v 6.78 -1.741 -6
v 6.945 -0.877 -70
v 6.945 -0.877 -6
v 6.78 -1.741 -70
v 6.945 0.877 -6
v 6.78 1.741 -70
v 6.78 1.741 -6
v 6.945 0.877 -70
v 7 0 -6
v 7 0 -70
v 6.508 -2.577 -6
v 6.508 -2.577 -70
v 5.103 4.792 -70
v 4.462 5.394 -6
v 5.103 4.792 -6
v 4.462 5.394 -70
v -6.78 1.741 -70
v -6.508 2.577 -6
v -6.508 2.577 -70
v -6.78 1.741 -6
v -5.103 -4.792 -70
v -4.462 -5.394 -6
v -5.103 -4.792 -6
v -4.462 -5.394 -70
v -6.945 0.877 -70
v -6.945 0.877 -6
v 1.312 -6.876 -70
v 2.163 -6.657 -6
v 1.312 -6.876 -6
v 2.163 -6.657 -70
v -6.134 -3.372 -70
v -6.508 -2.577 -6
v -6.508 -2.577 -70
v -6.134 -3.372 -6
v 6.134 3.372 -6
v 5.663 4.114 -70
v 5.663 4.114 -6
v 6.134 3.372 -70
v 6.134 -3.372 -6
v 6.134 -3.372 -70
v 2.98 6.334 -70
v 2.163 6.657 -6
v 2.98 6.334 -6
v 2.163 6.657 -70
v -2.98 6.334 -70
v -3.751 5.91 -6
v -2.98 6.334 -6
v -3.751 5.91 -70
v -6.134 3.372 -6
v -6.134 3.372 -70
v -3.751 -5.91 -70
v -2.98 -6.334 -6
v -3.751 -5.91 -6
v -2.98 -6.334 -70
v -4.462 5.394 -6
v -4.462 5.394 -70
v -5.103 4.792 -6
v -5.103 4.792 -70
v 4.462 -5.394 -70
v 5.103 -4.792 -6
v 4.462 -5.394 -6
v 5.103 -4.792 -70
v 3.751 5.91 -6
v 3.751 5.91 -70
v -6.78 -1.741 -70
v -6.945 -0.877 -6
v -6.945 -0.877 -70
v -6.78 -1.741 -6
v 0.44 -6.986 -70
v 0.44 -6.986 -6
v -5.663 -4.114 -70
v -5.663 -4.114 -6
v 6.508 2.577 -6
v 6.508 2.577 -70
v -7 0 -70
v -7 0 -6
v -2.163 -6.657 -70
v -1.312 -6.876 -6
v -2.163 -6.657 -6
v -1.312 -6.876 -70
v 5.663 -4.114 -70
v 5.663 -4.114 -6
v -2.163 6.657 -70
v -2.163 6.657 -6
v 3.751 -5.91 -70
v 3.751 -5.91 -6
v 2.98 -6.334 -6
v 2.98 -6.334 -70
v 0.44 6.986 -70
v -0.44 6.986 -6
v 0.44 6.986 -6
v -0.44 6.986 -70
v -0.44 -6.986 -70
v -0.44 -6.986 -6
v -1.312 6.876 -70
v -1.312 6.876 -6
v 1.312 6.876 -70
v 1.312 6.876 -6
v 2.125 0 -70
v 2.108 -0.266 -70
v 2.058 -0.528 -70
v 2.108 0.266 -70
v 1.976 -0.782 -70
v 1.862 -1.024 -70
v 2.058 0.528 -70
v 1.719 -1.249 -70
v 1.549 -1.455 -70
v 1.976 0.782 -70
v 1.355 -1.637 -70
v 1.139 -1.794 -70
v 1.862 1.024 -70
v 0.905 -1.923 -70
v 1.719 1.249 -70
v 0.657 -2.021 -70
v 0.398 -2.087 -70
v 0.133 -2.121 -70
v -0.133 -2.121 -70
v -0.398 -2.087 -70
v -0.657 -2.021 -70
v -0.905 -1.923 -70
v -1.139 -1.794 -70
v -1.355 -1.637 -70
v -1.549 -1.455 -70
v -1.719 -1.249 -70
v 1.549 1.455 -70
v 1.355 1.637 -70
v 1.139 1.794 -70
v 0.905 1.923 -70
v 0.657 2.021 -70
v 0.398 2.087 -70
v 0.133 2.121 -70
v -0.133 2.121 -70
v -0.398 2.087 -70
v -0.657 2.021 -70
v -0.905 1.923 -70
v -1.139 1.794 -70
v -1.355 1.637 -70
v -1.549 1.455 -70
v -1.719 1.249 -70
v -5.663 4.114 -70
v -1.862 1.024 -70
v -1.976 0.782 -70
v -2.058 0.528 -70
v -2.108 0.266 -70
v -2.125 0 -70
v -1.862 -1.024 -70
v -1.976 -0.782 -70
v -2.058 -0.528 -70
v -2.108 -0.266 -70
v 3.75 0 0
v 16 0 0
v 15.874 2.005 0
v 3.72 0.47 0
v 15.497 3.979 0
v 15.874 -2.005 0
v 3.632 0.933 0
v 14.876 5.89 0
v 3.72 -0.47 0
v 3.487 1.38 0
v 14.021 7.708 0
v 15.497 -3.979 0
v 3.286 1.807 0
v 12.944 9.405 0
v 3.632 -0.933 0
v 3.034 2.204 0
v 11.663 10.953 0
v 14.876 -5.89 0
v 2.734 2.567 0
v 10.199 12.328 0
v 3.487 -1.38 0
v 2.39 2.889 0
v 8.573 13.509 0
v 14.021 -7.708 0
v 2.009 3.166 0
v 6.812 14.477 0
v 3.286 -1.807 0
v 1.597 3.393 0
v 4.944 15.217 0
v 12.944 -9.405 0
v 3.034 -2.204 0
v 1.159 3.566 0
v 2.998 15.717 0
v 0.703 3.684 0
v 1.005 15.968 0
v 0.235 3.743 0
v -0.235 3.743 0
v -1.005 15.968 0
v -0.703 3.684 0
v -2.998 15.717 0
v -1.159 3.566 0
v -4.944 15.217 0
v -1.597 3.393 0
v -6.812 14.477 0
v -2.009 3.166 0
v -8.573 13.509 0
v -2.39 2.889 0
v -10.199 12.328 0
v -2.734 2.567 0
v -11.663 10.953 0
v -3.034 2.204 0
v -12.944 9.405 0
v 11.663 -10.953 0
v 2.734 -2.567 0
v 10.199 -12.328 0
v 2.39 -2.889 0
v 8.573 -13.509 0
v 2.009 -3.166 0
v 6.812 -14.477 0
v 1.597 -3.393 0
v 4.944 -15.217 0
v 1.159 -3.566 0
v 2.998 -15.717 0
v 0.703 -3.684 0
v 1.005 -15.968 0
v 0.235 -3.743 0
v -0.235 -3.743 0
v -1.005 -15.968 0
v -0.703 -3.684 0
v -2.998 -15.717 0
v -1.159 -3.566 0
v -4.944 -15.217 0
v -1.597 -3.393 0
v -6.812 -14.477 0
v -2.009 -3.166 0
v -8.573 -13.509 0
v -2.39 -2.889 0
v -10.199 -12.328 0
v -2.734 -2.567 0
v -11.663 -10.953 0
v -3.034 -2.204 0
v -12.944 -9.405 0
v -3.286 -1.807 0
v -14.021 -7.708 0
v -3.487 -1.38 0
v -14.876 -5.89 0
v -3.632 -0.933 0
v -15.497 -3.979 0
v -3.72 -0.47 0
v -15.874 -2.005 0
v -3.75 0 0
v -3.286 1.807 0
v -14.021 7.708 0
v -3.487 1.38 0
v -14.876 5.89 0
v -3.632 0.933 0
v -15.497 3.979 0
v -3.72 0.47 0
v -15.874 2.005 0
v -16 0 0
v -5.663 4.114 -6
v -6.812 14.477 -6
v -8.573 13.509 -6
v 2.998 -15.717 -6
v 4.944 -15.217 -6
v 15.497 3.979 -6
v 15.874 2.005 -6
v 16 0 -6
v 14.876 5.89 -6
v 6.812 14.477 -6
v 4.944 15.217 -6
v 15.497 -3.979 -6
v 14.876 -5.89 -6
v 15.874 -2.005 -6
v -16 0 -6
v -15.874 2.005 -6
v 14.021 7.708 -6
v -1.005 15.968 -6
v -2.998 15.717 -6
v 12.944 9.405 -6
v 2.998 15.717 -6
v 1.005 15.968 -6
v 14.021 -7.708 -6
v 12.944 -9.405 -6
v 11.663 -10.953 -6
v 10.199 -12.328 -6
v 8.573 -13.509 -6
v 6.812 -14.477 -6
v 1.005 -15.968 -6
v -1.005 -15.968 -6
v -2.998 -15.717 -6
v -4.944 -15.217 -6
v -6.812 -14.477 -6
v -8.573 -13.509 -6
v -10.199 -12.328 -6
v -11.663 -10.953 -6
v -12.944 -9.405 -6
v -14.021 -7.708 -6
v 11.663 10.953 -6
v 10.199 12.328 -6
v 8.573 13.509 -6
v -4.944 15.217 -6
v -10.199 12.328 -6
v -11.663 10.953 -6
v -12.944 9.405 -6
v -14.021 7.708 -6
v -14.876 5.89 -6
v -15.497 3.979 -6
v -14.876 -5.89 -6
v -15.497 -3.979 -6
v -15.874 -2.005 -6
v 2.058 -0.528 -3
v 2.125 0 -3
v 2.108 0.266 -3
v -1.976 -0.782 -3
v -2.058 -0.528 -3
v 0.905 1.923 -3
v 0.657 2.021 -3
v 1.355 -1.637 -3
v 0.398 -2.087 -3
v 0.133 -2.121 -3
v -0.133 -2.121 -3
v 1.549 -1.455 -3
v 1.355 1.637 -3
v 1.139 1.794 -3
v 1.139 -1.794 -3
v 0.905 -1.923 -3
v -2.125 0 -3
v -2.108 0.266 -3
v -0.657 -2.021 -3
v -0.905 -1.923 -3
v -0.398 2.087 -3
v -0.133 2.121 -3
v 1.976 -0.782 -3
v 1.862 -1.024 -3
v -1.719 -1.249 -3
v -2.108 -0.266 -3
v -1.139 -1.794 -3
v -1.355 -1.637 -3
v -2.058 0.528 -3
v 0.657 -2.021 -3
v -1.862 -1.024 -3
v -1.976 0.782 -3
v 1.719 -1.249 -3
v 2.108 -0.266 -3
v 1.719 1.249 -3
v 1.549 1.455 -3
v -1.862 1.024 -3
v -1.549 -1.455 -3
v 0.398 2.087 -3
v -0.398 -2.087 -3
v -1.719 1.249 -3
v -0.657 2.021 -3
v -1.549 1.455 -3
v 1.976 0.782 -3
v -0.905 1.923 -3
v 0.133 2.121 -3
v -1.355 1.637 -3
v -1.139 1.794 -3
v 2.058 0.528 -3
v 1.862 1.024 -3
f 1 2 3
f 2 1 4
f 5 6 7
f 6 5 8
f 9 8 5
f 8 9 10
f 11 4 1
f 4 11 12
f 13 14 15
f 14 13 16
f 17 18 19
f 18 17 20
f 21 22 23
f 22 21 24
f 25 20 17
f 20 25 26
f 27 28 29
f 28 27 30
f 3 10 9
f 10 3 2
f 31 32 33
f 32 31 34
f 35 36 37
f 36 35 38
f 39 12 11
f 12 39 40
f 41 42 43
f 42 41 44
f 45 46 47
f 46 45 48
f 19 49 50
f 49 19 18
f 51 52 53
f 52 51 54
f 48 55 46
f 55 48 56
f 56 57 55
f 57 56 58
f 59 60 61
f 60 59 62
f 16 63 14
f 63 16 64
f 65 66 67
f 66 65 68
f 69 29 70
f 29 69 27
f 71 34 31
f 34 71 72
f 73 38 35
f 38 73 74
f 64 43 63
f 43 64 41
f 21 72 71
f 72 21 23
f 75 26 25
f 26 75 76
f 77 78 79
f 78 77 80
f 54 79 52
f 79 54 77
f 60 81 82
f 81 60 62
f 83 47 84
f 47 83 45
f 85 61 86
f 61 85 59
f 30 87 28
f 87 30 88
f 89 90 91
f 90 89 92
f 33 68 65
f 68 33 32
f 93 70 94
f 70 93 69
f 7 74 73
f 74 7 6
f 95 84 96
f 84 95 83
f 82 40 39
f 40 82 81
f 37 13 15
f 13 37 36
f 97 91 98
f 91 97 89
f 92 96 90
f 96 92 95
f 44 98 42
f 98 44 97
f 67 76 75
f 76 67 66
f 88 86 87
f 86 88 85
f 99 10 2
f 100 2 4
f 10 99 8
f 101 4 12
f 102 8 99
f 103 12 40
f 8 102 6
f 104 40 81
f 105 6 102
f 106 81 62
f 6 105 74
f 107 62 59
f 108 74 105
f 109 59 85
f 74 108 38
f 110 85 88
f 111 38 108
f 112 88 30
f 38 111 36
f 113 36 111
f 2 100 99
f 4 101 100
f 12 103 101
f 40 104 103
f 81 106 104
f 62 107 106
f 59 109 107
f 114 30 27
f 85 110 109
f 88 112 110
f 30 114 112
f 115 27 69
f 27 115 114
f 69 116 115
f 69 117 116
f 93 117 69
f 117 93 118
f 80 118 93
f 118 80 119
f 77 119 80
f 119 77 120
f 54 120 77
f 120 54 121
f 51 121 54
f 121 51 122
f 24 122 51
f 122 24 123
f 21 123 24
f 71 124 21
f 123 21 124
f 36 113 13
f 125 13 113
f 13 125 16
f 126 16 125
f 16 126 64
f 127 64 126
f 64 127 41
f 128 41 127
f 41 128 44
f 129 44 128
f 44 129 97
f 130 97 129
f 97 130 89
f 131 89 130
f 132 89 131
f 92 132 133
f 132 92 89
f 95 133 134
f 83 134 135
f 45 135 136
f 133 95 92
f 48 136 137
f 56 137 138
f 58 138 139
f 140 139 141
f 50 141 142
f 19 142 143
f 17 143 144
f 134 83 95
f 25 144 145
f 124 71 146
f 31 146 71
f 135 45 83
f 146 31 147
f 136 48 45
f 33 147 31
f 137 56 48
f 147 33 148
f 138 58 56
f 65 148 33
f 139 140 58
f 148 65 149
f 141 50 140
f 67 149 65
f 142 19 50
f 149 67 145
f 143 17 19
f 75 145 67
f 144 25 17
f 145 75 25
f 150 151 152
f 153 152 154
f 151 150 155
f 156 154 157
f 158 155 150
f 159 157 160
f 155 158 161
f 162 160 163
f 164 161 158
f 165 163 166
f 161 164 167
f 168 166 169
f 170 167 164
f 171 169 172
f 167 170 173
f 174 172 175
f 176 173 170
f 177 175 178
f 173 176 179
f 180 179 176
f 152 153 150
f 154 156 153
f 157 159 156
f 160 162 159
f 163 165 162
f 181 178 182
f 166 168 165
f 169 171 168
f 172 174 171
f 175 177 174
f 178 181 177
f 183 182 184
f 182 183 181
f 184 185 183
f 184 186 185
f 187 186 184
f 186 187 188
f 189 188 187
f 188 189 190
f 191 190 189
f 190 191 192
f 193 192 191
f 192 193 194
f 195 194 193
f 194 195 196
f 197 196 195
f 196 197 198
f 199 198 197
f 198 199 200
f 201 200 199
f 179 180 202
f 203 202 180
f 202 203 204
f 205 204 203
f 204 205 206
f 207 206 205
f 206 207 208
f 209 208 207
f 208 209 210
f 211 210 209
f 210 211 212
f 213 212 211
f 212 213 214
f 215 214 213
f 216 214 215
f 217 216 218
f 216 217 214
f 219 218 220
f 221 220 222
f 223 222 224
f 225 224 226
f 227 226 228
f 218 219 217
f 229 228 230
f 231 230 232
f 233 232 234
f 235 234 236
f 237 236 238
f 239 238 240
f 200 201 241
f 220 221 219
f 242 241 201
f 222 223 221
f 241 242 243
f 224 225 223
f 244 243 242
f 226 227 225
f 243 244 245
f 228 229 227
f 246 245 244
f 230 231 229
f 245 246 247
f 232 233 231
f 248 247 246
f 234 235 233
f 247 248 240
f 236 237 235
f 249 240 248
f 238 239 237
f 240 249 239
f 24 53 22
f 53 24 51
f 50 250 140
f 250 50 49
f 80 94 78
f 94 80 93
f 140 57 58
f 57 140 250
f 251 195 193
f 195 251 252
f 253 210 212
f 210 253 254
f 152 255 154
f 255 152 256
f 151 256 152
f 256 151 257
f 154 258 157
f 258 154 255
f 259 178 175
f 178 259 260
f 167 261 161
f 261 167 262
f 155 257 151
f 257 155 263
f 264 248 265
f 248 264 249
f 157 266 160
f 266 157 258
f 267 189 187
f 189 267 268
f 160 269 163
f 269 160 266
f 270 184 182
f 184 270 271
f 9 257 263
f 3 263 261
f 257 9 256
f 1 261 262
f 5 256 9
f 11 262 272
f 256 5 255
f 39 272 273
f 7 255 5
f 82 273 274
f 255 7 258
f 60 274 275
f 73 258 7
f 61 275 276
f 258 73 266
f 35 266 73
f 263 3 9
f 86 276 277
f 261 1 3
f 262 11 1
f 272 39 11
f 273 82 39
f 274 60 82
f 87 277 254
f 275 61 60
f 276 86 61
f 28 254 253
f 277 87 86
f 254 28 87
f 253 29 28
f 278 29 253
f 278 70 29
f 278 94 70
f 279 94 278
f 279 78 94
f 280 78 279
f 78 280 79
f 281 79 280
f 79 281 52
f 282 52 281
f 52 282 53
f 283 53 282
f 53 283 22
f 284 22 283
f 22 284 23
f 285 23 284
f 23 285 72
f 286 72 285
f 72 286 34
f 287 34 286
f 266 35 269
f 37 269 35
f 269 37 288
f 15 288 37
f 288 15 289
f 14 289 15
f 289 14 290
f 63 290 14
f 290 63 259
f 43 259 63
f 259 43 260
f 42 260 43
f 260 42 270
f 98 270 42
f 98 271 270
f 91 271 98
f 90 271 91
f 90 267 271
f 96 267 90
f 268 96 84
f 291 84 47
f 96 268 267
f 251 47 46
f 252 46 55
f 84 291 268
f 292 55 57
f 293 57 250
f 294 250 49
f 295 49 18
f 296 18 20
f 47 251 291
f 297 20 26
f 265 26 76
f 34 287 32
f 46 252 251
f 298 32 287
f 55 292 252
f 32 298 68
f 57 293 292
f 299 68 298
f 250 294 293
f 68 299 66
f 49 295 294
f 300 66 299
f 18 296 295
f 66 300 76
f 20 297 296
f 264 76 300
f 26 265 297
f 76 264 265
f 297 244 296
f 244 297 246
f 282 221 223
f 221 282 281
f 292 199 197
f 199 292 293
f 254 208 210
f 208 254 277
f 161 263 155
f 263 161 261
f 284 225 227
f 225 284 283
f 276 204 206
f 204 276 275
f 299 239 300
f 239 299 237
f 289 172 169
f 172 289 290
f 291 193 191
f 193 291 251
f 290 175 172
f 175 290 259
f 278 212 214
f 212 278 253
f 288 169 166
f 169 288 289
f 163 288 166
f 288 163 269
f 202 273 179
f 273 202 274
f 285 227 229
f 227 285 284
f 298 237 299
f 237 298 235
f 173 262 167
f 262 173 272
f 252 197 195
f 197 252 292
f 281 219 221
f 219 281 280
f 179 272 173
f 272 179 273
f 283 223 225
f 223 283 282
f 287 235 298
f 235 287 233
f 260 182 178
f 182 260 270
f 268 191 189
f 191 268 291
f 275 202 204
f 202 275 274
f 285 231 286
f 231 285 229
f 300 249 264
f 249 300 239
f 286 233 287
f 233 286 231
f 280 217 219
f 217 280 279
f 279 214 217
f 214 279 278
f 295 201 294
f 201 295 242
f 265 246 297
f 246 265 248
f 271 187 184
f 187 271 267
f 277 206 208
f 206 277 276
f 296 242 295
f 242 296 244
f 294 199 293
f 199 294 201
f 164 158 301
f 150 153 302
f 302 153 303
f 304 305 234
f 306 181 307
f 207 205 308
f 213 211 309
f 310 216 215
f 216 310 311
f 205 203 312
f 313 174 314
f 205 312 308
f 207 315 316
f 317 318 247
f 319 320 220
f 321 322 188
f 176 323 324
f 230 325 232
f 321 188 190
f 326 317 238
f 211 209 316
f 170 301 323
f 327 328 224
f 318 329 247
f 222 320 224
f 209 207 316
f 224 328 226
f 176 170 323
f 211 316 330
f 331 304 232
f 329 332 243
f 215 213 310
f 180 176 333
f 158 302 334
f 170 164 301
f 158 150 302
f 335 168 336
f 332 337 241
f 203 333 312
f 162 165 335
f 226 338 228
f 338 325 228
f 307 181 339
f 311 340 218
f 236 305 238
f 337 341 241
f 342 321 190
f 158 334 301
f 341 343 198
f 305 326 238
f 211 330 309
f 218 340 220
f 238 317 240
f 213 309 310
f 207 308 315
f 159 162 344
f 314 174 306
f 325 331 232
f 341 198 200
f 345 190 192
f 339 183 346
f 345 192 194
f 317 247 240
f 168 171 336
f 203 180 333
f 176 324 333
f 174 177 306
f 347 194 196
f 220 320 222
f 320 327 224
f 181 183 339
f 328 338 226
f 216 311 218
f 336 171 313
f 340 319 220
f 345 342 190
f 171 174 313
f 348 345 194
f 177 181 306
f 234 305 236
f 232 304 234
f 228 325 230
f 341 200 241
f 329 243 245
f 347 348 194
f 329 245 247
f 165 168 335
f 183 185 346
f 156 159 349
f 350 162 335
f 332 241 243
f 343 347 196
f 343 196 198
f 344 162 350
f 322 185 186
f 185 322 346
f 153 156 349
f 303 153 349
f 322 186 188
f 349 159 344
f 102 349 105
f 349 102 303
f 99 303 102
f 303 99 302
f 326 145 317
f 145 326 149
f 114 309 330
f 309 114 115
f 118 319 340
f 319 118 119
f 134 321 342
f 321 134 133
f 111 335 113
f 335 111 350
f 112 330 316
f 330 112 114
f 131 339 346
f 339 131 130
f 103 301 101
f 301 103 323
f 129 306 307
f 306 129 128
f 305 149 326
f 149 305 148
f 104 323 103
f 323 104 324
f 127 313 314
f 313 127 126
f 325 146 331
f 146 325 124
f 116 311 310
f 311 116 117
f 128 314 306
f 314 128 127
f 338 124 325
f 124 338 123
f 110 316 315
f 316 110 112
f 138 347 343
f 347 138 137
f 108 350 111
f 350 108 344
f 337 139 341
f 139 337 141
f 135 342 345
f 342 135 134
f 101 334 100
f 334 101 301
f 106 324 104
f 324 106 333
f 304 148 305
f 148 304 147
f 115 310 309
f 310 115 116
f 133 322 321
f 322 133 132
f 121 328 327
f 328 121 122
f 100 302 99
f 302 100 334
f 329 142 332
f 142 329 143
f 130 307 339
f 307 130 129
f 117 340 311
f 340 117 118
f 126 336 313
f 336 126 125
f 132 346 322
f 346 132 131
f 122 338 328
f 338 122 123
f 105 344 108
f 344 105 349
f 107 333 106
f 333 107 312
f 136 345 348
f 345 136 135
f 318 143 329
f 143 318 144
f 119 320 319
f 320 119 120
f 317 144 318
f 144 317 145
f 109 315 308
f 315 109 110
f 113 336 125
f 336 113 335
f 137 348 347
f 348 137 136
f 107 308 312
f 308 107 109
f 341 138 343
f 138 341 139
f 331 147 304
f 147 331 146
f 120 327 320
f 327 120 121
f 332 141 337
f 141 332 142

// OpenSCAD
$fn = 50;


difference() {
	union() {
		translate(v = [0, 0, -70.0000000000]) {
			cylinder(h = 70, r = 7.0000000000);
		}
		translate(v = [0, 0, -6.0000000000]) {
			cylinder(h = 6, r = 16.0000000000);
		}
	}
	union() {
		translate(v = [0, 0, 0]) {
			rotate(a = [0, 0, 0]) {
				difference() {
					union() {
						#translate(v = [0, 0, -70.0000000000]) {
							cylinder(h = 70, r = 2.0000000000);
						}
						#translate(v = [0, 0, -3]) {
							cylinder(h = 3, r = 7.0000000000, r1 = 2.1250000000, r2 = 3.7500000000);
						}
						#translate(v = [0, 0, -70.0000000000]) {
							cylinder(h = 70, r = 2.1250000000);
						}
						#translate(v = [0, 0, -70.0000000000]) {
							cylinder(h = 70, r = 2.0000000000);
						}
					}
					union();
				}
			}
		}
	}
}
